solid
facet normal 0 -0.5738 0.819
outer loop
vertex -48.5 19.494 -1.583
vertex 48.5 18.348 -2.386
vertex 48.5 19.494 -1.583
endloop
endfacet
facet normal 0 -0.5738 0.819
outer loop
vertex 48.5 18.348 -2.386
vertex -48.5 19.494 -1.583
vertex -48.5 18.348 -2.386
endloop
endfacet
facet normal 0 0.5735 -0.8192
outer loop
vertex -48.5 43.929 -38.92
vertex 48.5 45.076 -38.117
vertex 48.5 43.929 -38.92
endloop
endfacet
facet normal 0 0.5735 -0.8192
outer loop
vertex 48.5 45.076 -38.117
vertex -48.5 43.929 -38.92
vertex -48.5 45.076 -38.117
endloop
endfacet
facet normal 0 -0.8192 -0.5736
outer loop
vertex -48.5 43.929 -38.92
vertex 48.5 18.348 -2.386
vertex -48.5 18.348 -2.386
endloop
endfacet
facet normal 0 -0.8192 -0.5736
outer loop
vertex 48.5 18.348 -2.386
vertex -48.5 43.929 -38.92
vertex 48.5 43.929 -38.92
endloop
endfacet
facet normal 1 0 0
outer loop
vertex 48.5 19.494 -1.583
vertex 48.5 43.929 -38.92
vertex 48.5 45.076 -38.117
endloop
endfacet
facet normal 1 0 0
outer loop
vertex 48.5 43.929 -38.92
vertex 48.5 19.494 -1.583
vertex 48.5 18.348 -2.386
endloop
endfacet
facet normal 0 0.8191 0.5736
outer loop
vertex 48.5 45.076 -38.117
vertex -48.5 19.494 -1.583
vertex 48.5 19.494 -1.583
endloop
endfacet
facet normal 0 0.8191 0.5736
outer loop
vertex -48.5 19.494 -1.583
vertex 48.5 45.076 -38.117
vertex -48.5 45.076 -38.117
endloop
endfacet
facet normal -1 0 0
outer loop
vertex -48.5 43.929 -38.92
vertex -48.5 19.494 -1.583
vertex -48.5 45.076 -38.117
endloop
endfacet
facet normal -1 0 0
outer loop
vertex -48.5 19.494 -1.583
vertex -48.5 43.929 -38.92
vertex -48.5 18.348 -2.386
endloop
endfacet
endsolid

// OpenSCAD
// file: ../wattplot_params.scad
// =============================================================================
// wattplot_params.scad -- mirror of wattplot_params.py
// =============================================================================
//
// DO NOT EDIT THESE NUMBERS WITHOUT UPDATING wattplot_params.py AND
// firmware/tests/test_openscad_params.py.
//
// The Python source of truth is wattplot_params.py at the repo root.
// This file is a hand-maintained mirror so the OpenSCAD models can
// render without Python. A CI test (test_openscad_params.py) reads
// both and fails if any number has drifted.
//
// If you change a value here, change it in wattplot_params.py first
// and update the test expectations in test_openscad_params.py. The
// commit message should reference the param name (e.g.
// "scad: bump POSTS.height_in to 78 for v3.1 storm margin").
//
// All dimensions are in inches. OpenSCAD's $fn controls mesh
// resolution -- 64 gives a clean STL that's about 2 MB at this
// model's complexity.

// ---------- LOCATION ----------
location_latitude  = 33.45;     // Phoenix, AZ
location_longitude = -112.07;
location_elevation_m = 337;
location_design_wind_mph = 115.0; // ASCE 7-22, Risk Cat II 700-yr

// ---------- PLANTER LIMITS ----------
max_planter_L_in = 96.0;          // 8 ft stock, no waste on long rails
max_planter_W_in = 60.0;          // 5 ft (8 ft cross-cut, 2 cross-rails per board)

// ---------- BED (planter, ballasted) ----------
bed_outer_L_in       = 96.0;       // 8 ft (capped at max_planter_L_in)
bed_outer_W_in       = 44.6;       // matches panel width
bed_wall_thk_in      = 0.75;       // 1x6 cedar (3/4" actual)
bed_wall_h_in        = 27.5;       // 5 courses of 1x6 (5.5" actual)
                                   //   wind-sized: SF_overturning 2.55 at 35°
bed_soil_fill_in     = 25.5;       // 2" freeboard below the rim
                                   //   ~60 cu ft = 2.2 cu yd = ~4,000 lb
bed_skid_h_in        = 1.5;        // walls rest on 2x4 footers
bed_skid_side_in     = 3.5;        // 4x nominal

// ---------- BED WALL (1x6 cedar skin over 2x4 cleats) ----------
wall_skin_thk_in   = 0.75;
wall_course_h_in   = 5.5;
wall_courses       = 5;            // 5 x 5.5" = 27.5" wall
wall_cleat_thk_in  = 1.5;          // 2x4 actual
wall_cleat_wid_in  = 3.5;          // 2x4 actual
wall_cleats_long   = 5;            // per long wall
wall_cleats_short  = 3;            // per short wall
wall_header_thk_in = 1.5;         // 2x4 on wide face
wall_header_wid_in = 3.5;

// ---------- POSTS (4x4 PT, 72" tall, walk-under canopy) ----------
post_thk_in  = 3.5;               // 4x4 actual
post_height_in = 72.0;            // 6 ft -- walk-under / reach-under
post_count   = 4;
post_rail_thk_in = 1.5;          // 2x6 on post tops
post_rail_wid_in = 5.5;

// ---------- PANEL (LONGi Hi-MO X10 620W default) ----------
panel_L_in        = 97.0;         // 8.08 ft (overhangs bed 0.5"/side)
panel_W_in        = 44.6;         // 3.72 ft
panel_thk_in      = 1.4;
panel_mass_lb     = 65.0;
panel_wattage     = 620;
panel_tilt_deg    = 35.0;         // 0 = flat, 35 = max (wind-limited)

// ---------- CONTROL (tilt cap + PI setpoint) ----------
control_max_tilt_deg  = 35.0;     // STRUCTURAL cap. See ADR-001.
control_target_current_A = 0.5;
control_hard_current_limit_A = 2.5;

// ---------- FRAME (perimeter around the panel) ----------
frame_long_rail_thk_in   = 1.5;    // 2x6 actual
frame_long_rail_wid_in   = 5.5;
frame_long_rail_length_in = 96.0;  // 8 ft stock, no waste

frame_cross_rail_thk_in   = 1.5;   // 2x6 actual
frame_cross_rail_wid_in   = 5.5;
frame_cross_rail_length_in = 42.0; // 2x6x8ft cut to 42"

frame_brace_thk_in   = 1.5;         // 2x4 actual
frame_brace_wid_in   = 3.5;
frame_brace_length_in = 102.0;     // 2x4x10ft cut to 102"

// ---------- HINGES + PANEL CLAMPS ----------
hinge_leaf_in    = 4.0;            // 4"x4" leaf, 1/2" pin
hinge_pin_d_in    = 0.5;
hinge_count      = 4;
hinge_spacing_in = 22.0;           // 22" o.c.
hinge_rod_length_in = 72.0;        // 1/2" x 72" steel rod (HD)

panel_clamp_length_in = 2.0;       // IronRidge mid-clamp, 35mm channel
panel_clamp_height_in = 2.0;
panel_clamp_thk_in   = 0.4;
panel_clamps_per_long_rail  = 2;
panel_clamps_per_cross_rail = 1;

// ---------- ACTUATOR MOUNT ----------
actuator_block_thk_in  = 1.5;      // 2x6 actual
actuator_block_wid_in  = 5.5;
actuator_block_length_in = 6.0;
actuator_stroke_in     = 4.0;       // 12V linear actuator
actuator_width_in      = 2.0;       // body width (for clearance check)
actuator_height_in     = 2.5;

// ---------- DERIVED (don't change) ----------
// Bed is sized so the panel overhangs the rails by 0.5" per side.
// The panel mid-clamps grip the aluminum frame, not the glass.
bed_inner_L_in = bed_outer_L_in - 2 * post_thk_in;
bed_inner_W_in = bed_outer_W_in - 2 * wall_skin_thk_in;
// Wall sits on top of skid; rim = wall + skid.
bed_rim_h_in = bed_wall_h_in + bed_skid_h_in;
// Panel frame offset above the bed rail (clearance for the clamp).
panel_clearance_in = 2.0;         // 2" above the rail top

// Render resolution: $fn controls segment count for curves.
// 64 gives a clean STL ~2 MB. Lower for fast preview, higher for
// 3D printing.
$fn = 64;
// main file
// =============================================================================
// parts/panel.scad -- the LONGi Hi-MO X10 620W (or any other preset)
// =============================================================================
//
// Tilts around the hinge axis (X axis at Y = bed_rim_h_in + 0.5,
// Z = -bed_outer_W_in/2 + 0.5).

include <../wattplot_params.scad>

module panel_assembly() {
    hinge_y = bed_rim_h_in + 0.5;
    hinge_z = -bed_outer_W_in/2 + 0.5;
    panel_pivot_x = 0;
    color(col_panel_default)
    translate([panel_pivot_x, hinge_y, hinge_z])
        rotate([panel_tilt_deg, 0, 0])   // tilt around the X axis
            translate([0, panel_clearance_in + panel_thk_in/2, bed_outer_W_in/2 - panel_W_in/2])
                cube([panel_L_in, panel_thk_in, panel_W_in], center=true);
}

col_panel_default = [0.20, 0.30, 0.55];   // LONGi blue

if (is_undef($use_only)) {
    $fn = 64;
    panel_assembly();
}
